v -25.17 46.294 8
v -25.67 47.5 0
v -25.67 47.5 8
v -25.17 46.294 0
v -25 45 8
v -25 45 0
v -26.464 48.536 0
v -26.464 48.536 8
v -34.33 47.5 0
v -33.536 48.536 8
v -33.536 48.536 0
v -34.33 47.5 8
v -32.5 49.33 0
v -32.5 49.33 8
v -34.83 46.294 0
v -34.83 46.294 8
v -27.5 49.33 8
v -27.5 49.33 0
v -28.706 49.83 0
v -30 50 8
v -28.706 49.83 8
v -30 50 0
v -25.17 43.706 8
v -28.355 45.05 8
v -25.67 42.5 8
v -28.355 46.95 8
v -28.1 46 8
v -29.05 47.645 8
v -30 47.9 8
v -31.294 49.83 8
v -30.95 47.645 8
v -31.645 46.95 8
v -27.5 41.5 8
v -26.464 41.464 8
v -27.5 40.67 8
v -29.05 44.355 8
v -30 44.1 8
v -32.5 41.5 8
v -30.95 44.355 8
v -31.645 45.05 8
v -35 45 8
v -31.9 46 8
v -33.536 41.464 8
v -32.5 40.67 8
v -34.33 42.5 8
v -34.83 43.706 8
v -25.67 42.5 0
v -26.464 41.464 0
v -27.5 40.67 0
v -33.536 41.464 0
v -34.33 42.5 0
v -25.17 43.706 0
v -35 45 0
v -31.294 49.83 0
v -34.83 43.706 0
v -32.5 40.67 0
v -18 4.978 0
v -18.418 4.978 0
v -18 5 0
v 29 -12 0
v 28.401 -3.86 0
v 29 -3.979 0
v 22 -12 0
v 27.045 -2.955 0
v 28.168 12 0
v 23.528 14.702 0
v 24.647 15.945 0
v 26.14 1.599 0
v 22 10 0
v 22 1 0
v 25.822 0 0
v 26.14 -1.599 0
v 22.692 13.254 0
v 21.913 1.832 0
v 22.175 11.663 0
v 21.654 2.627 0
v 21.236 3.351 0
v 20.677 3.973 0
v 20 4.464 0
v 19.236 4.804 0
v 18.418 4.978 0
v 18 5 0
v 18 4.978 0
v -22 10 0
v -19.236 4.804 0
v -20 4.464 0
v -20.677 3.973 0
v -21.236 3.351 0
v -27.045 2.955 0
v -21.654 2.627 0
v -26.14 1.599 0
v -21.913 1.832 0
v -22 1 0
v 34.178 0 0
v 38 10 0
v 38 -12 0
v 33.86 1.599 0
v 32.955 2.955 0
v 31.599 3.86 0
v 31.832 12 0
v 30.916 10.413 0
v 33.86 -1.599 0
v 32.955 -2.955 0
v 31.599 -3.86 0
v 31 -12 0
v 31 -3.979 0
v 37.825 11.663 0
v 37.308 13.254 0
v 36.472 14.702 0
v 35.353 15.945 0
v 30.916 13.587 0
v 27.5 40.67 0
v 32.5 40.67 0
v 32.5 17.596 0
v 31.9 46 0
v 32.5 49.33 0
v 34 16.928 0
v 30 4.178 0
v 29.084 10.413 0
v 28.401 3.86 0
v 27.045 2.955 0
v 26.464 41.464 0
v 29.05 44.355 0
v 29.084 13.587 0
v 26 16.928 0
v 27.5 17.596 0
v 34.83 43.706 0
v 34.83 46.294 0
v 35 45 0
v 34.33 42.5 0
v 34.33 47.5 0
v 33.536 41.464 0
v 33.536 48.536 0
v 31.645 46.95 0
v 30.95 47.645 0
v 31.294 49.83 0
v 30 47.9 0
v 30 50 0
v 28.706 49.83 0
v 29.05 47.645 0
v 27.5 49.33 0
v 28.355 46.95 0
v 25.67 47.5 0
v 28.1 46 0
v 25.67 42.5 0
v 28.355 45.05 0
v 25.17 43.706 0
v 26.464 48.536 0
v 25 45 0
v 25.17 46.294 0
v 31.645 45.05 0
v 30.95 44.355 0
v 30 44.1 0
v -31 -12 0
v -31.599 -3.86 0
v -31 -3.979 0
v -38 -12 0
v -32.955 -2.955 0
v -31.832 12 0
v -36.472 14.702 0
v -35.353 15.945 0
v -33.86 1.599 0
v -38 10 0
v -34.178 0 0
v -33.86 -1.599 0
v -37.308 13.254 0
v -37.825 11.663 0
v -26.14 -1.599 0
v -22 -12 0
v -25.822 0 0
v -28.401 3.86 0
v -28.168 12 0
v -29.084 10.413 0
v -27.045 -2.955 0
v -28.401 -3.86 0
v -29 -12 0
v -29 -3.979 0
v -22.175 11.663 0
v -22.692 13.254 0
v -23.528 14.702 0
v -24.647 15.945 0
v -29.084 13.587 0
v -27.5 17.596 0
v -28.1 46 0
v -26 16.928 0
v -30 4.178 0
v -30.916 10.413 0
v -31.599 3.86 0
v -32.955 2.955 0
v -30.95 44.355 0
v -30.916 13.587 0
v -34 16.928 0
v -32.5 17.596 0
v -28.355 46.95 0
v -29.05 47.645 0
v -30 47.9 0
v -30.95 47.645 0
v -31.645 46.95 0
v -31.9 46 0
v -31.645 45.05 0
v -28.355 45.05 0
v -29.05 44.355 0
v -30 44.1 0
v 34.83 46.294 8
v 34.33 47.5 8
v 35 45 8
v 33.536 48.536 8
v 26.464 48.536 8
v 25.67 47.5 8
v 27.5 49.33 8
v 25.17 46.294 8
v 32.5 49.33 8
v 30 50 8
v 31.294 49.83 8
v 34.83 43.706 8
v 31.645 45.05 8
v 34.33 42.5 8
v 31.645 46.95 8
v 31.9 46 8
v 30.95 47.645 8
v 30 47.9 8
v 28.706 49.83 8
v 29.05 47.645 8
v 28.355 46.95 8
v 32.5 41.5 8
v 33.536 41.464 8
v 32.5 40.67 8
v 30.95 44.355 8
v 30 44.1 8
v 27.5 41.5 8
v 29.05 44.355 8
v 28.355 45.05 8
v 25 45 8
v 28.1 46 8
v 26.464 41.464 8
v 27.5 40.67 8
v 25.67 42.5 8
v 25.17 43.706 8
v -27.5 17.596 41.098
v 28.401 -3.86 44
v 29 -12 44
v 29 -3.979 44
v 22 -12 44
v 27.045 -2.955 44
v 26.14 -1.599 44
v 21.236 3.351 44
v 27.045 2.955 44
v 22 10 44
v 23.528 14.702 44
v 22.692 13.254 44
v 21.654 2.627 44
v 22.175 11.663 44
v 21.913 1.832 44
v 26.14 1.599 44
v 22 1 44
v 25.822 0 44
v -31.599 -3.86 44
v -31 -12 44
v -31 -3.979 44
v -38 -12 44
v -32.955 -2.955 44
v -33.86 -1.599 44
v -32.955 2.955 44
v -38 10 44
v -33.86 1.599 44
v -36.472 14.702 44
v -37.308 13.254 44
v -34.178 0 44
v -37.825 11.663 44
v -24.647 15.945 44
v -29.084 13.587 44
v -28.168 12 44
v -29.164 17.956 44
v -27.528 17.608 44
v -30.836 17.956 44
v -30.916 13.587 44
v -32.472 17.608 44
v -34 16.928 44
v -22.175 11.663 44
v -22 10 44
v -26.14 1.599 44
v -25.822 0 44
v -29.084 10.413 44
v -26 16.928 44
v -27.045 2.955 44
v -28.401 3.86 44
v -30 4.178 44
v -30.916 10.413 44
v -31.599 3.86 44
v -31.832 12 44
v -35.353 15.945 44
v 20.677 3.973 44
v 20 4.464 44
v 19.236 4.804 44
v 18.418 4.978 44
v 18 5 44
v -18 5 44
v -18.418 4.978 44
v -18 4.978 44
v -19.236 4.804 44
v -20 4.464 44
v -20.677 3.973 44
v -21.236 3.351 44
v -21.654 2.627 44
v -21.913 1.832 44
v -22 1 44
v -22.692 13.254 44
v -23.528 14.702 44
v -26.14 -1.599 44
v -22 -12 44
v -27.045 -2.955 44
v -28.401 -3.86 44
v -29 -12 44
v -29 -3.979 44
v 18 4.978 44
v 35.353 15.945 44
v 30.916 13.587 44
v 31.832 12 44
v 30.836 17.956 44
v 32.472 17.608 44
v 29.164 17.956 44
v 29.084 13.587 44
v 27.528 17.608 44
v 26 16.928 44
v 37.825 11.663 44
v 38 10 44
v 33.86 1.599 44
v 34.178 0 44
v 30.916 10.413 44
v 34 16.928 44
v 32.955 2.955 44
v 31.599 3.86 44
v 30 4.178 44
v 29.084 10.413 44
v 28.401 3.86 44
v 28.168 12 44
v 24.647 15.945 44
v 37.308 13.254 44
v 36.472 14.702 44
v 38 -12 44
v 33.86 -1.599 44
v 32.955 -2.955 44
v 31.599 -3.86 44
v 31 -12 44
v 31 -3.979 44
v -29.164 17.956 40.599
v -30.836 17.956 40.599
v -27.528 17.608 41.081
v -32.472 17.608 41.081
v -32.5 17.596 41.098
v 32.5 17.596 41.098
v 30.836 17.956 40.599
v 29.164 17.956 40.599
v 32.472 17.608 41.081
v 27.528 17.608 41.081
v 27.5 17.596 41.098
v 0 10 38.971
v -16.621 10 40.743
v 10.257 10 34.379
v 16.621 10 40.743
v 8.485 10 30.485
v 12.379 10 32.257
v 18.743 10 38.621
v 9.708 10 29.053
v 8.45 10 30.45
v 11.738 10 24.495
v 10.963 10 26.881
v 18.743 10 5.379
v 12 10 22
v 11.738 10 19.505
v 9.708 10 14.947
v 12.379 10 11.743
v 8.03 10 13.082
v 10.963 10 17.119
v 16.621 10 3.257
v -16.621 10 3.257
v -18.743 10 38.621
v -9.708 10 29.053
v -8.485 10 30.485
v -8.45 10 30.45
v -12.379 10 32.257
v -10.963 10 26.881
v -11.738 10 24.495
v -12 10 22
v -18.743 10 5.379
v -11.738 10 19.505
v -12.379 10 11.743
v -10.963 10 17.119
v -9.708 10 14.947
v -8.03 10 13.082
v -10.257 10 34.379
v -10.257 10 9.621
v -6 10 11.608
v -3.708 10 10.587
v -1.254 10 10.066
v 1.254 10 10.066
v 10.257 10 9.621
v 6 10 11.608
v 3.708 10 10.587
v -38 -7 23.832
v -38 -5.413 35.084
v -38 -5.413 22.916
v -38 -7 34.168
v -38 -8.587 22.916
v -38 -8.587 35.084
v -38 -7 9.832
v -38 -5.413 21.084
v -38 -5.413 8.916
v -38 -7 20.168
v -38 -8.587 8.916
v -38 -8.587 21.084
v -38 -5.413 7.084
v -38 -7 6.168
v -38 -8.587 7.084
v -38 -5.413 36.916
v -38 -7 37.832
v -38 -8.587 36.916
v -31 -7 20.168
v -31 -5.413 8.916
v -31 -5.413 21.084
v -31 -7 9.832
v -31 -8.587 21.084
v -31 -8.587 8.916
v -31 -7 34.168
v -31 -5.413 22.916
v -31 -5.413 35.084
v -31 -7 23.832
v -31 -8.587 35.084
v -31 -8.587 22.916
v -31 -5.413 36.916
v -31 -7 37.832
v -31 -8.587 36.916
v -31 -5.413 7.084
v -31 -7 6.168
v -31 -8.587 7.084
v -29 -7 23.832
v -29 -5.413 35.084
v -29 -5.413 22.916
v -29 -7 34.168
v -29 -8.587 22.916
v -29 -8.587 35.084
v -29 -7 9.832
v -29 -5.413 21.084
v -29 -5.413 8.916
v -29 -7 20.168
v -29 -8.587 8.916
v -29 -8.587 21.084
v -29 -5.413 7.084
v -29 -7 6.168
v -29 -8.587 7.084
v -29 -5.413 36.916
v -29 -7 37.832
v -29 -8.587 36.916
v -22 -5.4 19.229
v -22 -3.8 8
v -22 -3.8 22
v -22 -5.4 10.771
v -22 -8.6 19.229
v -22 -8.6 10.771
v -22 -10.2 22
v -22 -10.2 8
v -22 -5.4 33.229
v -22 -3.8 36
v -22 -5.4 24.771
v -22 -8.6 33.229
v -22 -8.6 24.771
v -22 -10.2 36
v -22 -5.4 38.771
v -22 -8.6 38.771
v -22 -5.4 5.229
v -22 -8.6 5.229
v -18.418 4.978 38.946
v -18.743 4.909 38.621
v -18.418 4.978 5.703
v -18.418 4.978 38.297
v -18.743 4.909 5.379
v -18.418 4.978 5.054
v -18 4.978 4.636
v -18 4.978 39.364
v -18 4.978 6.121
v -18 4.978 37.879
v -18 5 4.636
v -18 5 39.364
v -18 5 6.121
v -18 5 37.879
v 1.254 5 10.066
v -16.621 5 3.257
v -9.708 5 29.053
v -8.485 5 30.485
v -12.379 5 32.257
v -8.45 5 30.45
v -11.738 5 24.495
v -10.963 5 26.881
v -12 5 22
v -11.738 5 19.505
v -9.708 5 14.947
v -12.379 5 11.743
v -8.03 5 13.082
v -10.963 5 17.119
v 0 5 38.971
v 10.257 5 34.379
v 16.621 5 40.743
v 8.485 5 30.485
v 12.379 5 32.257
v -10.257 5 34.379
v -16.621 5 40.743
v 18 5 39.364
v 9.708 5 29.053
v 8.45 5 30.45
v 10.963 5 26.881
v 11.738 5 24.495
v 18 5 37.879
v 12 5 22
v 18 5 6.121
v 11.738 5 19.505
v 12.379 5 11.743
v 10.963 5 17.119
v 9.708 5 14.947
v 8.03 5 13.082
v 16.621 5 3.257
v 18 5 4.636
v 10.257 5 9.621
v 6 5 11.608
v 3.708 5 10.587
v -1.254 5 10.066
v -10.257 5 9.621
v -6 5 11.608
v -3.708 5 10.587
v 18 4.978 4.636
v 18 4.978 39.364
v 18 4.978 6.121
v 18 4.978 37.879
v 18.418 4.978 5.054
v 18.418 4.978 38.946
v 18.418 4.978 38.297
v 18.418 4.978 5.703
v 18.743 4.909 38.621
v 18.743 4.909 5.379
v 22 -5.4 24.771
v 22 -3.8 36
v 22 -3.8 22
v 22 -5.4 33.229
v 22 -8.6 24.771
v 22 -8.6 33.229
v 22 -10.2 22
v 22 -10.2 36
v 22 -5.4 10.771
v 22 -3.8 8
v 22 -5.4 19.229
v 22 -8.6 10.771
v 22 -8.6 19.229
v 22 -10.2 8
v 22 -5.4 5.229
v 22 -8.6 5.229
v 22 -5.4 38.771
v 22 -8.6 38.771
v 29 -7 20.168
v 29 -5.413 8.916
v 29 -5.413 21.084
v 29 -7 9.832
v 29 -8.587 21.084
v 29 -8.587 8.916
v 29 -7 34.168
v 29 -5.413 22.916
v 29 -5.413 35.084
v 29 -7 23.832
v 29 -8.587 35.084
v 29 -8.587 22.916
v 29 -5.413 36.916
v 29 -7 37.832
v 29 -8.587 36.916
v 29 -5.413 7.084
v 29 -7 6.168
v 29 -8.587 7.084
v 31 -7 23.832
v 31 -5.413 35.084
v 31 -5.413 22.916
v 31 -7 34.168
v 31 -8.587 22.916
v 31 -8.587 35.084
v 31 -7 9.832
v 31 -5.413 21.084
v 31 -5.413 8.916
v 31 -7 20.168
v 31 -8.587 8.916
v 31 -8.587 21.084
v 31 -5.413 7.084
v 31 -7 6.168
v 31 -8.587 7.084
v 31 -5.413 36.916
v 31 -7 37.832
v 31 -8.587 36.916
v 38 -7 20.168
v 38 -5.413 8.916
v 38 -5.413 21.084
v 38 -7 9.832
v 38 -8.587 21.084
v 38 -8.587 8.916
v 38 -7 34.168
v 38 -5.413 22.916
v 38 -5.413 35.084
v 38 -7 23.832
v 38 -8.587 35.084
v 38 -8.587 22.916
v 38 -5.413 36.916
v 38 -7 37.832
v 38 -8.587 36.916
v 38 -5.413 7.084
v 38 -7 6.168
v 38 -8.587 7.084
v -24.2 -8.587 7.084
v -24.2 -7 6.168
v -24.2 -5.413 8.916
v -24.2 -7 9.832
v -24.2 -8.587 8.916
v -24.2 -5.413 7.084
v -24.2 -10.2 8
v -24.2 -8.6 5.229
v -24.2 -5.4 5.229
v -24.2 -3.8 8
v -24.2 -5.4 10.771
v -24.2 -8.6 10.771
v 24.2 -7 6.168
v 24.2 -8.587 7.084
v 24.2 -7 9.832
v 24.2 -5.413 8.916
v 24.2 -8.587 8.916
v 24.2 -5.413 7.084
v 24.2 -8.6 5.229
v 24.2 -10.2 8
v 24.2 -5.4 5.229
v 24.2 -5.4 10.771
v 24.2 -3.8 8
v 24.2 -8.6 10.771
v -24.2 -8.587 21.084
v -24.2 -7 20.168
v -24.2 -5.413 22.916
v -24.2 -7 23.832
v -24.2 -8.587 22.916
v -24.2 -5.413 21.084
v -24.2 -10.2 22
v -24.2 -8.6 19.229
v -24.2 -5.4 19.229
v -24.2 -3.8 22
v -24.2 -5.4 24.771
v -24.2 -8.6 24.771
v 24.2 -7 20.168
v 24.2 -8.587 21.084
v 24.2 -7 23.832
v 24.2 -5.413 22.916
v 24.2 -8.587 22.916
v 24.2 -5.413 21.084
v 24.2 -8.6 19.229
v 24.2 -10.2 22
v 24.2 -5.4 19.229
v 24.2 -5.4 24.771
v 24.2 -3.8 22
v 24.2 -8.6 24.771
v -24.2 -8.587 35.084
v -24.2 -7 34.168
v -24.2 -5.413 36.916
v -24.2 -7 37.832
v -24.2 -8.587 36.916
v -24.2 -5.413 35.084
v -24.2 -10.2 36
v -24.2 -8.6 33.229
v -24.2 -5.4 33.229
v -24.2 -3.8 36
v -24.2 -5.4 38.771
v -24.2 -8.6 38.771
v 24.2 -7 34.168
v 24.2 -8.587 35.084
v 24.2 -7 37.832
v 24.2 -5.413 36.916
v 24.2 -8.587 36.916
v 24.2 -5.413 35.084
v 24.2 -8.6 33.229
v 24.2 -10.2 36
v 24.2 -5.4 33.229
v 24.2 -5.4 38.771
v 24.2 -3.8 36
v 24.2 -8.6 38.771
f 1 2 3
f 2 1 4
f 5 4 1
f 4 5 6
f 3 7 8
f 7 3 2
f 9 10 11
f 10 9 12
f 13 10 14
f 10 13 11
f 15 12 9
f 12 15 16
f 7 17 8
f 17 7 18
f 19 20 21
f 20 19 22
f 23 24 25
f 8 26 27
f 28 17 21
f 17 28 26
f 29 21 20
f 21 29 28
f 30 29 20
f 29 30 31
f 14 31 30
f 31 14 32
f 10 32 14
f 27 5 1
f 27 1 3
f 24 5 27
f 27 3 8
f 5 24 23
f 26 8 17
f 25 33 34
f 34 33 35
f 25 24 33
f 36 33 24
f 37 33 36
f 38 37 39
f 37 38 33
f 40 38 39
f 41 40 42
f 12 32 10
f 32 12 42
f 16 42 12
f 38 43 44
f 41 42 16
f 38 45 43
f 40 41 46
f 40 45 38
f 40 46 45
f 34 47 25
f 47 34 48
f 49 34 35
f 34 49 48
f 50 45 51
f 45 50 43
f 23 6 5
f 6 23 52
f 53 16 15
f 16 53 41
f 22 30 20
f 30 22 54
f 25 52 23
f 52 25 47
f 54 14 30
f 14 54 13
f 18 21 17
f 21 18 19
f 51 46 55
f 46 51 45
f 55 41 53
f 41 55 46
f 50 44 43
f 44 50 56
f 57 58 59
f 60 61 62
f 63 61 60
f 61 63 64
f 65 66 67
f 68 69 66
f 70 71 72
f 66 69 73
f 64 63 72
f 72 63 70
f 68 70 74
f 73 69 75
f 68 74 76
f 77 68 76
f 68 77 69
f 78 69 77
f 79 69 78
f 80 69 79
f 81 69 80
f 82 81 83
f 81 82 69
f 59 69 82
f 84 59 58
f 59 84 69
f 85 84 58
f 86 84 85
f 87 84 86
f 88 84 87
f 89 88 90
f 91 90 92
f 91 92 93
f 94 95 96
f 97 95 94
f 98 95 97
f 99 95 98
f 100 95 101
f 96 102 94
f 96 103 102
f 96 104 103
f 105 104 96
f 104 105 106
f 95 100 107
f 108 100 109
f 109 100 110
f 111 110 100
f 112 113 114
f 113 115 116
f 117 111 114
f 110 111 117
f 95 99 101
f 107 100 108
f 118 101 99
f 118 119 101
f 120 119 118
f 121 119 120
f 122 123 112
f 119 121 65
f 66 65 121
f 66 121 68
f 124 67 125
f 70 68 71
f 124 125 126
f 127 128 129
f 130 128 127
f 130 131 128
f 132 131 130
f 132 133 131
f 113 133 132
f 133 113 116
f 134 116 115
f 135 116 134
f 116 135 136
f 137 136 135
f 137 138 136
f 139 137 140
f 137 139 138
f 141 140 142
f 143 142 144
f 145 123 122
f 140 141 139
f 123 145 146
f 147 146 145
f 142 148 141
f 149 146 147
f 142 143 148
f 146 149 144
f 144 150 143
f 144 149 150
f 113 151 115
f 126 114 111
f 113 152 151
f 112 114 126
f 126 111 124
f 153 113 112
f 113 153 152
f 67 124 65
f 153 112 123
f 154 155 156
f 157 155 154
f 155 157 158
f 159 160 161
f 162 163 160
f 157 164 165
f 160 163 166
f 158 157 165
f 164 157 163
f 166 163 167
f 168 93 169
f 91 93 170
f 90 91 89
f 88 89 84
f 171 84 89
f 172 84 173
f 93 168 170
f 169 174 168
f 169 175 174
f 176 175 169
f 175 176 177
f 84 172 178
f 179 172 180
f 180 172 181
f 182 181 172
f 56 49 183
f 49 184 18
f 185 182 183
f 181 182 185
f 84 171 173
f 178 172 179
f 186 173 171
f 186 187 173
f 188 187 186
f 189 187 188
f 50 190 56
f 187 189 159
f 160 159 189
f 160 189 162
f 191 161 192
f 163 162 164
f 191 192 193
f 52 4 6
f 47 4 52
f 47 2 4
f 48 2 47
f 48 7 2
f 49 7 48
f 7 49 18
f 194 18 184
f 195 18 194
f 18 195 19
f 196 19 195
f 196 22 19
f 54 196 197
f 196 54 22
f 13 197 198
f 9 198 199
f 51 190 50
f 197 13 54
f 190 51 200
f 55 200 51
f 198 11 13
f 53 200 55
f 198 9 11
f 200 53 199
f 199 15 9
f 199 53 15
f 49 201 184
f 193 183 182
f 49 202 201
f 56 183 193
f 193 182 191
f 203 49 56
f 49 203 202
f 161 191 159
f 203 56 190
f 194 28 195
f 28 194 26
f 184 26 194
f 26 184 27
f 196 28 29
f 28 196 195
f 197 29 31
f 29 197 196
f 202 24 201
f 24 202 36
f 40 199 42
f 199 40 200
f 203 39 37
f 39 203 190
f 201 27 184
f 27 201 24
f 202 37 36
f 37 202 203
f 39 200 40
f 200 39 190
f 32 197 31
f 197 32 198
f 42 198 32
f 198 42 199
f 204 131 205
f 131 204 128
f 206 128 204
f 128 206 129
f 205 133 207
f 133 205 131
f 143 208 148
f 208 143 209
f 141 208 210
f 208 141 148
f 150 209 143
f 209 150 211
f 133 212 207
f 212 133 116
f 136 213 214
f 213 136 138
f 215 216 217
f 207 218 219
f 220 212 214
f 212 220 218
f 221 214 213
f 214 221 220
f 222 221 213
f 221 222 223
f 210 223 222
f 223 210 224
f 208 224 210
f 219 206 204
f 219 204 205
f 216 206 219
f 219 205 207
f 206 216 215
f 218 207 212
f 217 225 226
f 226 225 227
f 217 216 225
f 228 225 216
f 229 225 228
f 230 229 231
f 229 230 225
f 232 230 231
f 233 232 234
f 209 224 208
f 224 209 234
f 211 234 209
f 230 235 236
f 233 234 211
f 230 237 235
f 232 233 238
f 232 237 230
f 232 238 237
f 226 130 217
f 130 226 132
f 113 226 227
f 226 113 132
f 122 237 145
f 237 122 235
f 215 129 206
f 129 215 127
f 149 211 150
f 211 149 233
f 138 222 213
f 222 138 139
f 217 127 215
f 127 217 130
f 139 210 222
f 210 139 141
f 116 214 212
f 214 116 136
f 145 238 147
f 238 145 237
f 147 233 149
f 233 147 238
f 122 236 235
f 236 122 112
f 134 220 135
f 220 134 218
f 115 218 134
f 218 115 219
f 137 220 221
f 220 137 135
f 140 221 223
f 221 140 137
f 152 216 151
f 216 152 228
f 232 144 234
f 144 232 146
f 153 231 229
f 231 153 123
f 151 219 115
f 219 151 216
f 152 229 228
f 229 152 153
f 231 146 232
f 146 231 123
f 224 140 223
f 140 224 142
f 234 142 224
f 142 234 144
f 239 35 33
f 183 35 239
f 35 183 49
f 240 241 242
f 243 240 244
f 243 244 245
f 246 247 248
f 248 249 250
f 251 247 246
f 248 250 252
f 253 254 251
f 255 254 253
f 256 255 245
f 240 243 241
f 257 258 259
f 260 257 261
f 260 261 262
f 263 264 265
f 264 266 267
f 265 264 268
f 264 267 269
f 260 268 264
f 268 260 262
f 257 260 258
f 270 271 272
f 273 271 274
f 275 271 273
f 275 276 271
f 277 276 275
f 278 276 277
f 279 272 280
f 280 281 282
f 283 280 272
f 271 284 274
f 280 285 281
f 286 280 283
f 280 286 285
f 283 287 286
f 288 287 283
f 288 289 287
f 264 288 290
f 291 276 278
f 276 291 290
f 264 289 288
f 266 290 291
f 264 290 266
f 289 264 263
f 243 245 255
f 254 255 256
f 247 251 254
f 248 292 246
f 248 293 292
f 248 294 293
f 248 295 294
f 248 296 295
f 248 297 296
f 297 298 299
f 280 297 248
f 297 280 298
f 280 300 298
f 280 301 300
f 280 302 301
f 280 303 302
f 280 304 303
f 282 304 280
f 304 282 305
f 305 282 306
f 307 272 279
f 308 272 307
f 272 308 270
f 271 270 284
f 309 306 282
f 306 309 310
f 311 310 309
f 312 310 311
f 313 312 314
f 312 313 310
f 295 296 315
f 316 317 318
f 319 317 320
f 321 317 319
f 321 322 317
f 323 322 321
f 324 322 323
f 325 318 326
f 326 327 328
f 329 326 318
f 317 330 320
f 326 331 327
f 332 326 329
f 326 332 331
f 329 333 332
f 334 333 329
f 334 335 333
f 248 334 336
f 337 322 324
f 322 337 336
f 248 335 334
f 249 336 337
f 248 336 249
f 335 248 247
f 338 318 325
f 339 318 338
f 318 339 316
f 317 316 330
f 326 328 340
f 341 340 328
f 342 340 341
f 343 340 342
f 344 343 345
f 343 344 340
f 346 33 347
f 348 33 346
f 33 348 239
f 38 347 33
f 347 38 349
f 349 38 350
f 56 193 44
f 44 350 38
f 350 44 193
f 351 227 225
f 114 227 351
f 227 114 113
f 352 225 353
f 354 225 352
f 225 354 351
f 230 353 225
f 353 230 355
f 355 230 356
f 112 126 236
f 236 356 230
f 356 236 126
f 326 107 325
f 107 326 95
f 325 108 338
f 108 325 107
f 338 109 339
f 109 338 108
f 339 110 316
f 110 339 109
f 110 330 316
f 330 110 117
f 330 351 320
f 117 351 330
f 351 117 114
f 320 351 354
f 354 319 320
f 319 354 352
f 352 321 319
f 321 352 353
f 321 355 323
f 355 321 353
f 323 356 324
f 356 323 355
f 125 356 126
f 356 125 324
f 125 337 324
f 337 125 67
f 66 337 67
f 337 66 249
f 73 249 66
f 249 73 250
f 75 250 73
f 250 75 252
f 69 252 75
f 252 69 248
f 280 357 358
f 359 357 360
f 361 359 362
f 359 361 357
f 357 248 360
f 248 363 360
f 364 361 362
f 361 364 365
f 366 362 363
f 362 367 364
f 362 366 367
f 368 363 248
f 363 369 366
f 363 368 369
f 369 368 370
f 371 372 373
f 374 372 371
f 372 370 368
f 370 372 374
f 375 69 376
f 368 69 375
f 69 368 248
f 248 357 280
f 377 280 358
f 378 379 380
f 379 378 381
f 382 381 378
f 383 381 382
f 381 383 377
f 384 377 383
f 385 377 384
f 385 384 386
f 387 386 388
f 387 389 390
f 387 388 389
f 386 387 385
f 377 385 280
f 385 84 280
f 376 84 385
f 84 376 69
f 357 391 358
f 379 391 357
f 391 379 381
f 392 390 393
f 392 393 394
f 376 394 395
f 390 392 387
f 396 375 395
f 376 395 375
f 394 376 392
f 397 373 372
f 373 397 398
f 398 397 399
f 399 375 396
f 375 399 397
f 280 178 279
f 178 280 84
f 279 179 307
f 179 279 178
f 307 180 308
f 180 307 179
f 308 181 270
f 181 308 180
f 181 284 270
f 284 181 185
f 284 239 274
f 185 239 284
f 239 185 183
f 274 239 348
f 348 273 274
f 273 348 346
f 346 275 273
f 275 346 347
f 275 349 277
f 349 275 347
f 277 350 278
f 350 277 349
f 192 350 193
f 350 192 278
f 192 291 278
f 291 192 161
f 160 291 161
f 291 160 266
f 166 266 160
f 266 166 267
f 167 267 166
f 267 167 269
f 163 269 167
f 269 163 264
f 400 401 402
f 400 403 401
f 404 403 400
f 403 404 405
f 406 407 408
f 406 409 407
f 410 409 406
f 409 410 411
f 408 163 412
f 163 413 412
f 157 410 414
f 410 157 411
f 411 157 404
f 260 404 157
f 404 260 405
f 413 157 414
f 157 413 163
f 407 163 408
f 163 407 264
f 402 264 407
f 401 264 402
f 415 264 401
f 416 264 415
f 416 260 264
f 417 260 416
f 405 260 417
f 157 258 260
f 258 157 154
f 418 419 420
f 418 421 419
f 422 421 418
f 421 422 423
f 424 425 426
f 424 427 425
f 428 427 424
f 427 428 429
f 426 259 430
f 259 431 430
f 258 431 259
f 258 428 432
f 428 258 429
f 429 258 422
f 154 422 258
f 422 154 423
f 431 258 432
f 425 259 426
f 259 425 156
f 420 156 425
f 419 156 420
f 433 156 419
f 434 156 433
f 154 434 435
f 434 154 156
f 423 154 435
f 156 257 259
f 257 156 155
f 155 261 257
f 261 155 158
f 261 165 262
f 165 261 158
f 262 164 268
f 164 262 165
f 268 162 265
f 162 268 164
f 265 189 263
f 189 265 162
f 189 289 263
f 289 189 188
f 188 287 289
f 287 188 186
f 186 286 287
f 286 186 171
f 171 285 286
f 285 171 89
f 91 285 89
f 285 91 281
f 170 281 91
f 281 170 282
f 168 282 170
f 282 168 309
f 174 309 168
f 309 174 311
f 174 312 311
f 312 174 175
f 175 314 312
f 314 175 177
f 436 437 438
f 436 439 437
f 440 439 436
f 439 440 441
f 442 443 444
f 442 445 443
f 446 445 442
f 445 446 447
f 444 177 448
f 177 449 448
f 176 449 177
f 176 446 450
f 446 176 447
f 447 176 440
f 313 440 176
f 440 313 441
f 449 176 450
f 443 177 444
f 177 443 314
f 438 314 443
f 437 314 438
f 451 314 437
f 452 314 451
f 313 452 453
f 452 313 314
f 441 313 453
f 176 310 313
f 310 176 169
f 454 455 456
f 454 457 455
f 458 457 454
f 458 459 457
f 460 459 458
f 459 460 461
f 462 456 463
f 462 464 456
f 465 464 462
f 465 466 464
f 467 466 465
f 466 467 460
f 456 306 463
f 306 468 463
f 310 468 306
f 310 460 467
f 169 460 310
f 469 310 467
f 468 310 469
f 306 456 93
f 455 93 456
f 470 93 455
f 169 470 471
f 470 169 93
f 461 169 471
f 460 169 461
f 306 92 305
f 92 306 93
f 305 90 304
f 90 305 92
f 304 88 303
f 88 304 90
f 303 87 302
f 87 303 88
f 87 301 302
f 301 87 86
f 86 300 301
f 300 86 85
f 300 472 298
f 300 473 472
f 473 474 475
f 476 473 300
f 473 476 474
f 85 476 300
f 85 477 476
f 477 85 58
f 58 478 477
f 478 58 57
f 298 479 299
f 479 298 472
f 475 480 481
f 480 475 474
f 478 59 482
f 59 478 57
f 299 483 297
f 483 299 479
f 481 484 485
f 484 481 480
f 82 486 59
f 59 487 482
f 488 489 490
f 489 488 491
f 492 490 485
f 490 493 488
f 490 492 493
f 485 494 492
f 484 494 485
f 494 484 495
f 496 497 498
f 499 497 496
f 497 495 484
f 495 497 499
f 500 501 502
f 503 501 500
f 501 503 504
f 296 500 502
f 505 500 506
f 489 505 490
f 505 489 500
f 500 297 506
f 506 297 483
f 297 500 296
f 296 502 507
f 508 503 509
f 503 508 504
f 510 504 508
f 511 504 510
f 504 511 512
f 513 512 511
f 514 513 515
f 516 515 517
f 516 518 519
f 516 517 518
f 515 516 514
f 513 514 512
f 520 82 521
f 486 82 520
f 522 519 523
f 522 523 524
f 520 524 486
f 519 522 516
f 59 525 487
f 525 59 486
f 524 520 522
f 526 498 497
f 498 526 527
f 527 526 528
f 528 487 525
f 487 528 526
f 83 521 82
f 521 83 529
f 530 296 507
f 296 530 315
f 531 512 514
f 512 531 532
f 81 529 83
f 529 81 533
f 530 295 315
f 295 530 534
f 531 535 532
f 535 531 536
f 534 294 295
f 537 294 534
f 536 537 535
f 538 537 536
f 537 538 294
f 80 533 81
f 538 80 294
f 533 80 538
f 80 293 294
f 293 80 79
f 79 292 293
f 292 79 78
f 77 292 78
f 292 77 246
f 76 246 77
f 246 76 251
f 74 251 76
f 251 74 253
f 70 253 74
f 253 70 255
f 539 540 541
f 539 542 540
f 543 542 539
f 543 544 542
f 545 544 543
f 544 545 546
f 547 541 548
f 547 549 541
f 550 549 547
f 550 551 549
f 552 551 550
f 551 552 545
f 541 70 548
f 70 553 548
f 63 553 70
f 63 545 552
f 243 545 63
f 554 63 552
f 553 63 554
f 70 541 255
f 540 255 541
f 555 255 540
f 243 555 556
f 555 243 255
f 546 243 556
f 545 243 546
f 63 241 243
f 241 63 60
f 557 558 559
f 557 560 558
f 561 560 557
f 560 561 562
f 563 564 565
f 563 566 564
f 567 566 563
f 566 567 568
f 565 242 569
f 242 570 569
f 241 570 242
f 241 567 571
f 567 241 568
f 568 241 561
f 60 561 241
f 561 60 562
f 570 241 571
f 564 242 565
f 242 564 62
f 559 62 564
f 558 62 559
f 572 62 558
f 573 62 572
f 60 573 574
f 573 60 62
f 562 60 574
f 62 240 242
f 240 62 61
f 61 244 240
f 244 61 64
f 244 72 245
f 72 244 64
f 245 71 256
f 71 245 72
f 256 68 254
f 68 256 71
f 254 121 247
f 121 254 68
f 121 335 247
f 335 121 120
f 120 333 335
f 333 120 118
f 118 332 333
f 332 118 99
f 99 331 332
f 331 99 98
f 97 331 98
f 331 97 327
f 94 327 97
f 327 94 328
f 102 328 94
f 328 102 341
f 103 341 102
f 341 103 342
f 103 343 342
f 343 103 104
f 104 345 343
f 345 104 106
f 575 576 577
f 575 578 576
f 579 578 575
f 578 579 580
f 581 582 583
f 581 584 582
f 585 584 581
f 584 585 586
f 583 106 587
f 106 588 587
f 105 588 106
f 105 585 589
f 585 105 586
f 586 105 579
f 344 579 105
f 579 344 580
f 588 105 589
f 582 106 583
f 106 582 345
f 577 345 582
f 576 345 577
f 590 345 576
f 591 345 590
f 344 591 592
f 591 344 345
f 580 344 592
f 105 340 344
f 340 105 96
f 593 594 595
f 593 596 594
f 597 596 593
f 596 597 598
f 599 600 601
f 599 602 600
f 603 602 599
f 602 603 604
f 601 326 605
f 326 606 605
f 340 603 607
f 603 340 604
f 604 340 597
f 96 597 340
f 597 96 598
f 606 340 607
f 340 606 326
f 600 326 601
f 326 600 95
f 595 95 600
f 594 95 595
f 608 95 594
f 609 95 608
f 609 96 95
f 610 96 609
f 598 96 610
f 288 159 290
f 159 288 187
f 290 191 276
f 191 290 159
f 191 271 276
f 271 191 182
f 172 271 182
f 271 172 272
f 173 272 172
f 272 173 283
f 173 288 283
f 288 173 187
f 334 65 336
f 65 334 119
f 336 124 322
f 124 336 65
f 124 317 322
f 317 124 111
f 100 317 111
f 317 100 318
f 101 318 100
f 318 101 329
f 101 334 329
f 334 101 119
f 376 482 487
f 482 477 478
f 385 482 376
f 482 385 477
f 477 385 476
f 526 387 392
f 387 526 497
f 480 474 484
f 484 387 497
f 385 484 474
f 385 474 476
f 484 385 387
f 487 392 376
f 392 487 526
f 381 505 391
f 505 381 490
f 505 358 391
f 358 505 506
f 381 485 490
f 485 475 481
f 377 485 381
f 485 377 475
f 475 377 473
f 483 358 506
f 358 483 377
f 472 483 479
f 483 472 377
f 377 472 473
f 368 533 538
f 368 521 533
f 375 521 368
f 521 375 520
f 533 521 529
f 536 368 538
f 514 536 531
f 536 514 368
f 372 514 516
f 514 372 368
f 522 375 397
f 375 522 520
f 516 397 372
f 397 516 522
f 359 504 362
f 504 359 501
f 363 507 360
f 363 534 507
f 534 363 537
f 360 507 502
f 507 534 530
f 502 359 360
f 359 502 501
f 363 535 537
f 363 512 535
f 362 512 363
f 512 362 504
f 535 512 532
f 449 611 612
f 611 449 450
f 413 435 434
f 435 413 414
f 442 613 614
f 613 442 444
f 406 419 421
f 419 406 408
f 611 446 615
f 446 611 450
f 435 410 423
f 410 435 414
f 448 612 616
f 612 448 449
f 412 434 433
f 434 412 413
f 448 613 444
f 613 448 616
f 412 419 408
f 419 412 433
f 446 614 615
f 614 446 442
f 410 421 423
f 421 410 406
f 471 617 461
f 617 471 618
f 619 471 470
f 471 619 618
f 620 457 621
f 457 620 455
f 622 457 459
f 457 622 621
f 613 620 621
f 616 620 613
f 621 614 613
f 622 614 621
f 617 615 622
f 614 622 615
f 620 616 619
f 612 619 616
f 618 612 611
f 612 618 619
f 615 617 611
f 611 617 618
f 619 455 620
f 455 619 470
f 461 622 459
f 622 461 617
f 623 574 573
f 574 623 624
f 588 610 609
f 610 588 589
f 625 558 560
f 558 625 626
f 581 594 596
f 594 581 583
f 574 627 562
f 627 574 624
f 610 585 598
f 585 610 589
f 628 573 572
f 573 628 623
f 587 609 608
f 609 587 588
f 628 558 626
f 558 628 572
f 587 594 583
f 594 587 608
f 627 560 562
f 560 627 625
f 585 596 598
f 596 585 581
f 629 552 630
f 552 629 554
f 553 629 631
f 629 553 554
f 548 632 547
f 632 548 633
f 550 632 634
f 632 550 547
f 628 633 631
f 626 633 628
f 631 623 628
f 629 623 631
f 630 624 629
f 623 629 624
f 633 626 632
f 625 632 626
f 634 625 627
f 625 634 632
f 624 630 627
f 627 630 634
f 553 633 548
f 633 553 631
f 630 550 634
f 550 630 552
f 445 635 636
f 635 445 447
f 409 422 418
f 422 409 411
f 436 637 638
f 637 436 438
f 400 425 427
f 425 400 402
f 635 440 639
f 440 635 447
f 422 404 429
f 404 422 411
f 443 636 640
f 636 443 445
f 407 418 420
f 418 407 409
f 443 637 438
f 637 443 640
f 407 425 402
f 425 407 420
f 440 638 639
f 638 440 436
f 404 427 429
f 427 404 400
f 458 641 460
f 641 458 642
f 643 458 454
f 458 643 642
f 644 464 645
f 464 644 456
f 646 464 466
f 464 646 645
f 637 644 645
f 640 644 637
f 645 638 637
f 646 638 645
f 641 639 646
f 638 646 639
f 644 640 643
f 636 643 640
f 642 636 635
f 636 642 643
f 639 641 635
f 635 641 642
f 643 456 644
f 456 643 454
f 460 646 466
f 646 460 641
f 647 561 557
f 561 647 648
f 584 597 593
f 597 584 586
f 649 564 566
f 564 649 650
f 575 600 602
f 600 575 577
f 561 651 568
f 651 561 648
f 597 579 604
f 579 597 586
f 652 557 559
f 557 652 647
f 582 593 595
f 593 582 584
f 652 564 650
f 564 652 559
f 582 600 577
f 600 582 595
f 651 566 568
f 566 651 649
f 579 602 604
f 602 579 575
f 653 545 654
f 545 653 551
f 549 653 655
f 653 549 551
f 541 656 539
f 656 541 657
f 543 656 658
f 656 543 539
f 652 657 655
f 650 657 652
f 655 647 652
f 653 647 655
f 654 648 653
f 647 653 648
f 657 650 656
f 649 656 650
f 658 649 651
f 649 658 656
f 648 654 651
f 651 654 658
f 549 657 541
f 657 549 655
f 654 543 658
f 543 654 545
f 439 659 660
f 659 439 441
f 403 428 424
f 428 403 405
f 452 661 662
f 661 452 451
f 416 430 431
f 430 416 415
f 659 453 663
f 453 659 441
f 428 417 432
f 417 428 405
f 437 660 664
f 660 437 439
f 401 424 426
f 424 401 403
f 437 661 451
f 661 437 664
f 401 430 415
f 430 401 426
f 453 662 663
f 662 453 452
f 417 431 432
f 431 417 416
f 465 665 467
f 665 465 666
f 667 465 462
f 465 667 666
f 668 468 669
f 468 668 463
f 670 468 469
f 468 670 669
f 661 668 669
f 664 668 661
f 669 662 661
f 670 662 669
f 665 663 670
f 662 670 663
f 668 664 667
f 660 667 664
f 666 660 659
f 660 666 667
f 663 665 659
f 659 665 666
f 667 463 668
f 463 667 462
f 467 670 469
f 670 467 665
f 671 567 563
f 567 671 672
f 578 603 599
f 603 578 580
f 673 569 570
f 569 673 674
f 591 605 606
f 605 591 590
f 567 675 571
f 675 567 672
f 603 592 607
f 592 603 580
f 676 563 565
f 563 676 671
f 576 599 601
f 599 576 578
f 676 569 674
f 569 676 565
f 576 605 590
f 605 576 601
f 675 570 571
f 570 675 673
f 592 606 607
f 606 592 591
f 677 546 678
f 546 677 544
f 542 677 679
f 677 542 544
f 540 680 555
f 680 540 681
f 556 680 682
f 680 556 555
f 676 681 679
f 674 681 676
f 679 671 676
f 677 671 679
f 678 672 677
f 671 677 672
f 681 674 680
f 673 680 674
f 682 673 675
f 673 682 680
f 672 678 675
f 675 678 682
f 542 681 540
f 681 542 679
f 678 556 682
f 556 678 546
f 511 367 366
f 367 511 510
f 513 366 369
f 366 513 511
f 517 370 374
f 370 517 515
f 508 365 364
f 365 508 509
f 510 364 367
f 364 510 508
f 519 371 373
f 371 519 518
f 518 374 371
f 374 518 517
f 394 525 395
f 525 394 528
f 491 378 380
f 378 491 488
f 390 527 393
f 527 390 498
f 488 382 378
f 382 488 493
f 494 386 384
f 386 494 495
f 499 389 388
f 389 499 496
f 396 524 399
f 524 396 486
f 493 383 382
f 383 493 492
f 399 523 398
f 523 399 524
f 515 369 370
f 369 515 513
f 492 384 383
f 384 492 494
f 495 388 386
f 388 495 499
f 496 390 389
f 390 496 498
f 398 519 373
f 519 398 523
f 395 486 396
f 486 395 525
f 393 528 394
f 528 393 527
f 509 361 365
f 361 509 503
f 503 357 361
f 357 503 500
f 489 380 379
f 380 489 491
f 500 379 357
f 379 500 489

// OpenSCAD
// file: polyholes.scad
//
// Mendel90
//
// GNU GPL v2
// nop.head@gmail.com
// hydraraptor.blogspot.com
//
// See http://hydraraptor.blogspot.com/2011/02/polyholes.html
//
function sides(r) = max(round(4 *r),3);
function corrected_radius(r,n) = 0.1 + r / cos(180 / n);
function corrected_diameter(d) = 0.2 + d / cos(180 / sides(d / 2));

module poly_circle(r, center = false) {
    n = sides(r);
    circle(r = corrected_radius(r,n), $fn = n, center = center);
}

module poly_cylinder(r, h, center = false) {
    n = sides(r);
    cylinder(h = h, r = corrected_radius(r,n), $fn = n, center = center);
}

module poly_d_cylinder(r, center = false) {
    n = sides(r);
    r = corrected_radius(r,n);
    cylinder(h = h, r = r, $fn = n, center = center);
    translate([0, -r, 0])
        cube([r, 2 * r, h]);
}

/**
 * Make a thin-walled cylindrical tube.
 * @param r outside radius
 * @param h height of tube
 * @param thickness wall thickness
 */
module poly_tube(r = 5, h = 5, thickness = 1, center = false) {
    translate(center ? [0, 0, -h / 2] : 0) linear_extrude(height = h) difference() {
        circle(r);
        poly_circle(r - thickness);
    }
}
// file: bracket.scad
include <configuration.scad>

$fa = 12;
$fs = 0.5;
use <polyholes.scad>

side_thickness=16;
round_rad=4;
min_pinch_thickness=4;


module screws() {
  screw_rad=3.0/2;
  nut_depth=2.3;
  for (x = [-1, 1]) {
    translate([x*smooth_rod_separation/2, 0, 0]) {
      // Push-through M3 screw hole.
      translate([0, -smooth_rod_radius-2*screw_rad, 0]) rotate([0, 90, 0])
	poly_cylinder(r=screw_rad, h=side_thickness+2, center=true);
      // M3 nut holder.
      translate([-x*(side_thickness/2-nut_depth/2+0.1), -smooth_rod_radius-2*screw_rad, 0])
	rotate([30, 0, 0]) rotate([0, 90, 0])
	cylinder(r=3.2, h=nut_depth, center=true, $fn=6);
    }
  }
}

module fins(h) {
    for (x = [-1, 1]) {
        // Diagonal fins.
        hull() {
            translate([x*smooth_rod_separation/2, bracket_fin_length-4, 8/2-h/2]) cube([5, 1, 8], center=true);
            translate([x*smooth_rod_separation/2, 15, 0]) #cube([5, 1, h], center=true);
        }
        // Extra mounting screw holes.
        translate([x*smooth_rod_separation/2, bracket_fin_length, 4-h/2]) difference() {
            cylinder(r=5, h=8, center=true, $fn=24);
            translate([0, 1, 0]) cylinder(r=1.9, h=9, center=true, $fn=12);
        }
    }
}

module bracket(h,fins=false) {
  translate([0, 0, -h/2]) linear_extrude(height=h, convexity=3) difference() {
    union() {
      translate([0, 3-smooth_rod_radius]) square([smooth_rod_separation+side_thickness, smooth_rod_radius + 18], center=true);
      for (x = [-smooth_rod_separation/2, smooth_rod_separation/2]) {
        // Sandwich mount.
        translate([x, 10]) circle(r=side_thickness/2, center=true);
        // Smooth rod mounting slot extra.
	translate([x, 0]) circle(r=smooth_rod_radius+min_pinch_thickness, center=true);
      }
    }
    for (x = [-smooth_rod_separation/2, smooth_rod_separation/2]) {
      // Sandwich mount.
      translate([x, 12]) poly_circle(r=1.5, center=true);
      // Smooth rod mounting slots.
      translate([x, 0]) {
	poly_circle(r=smooth_rod_radius, center=true);
	translate([0, -10, 0]) square([2, 20], center=true);
      }
    }
    // Belt path.
    difference() {
      union() {
	translate([0, -5]) square([smooth_rod_separation-side_thickness-2*round_rad, 20], center=true);
	translate([0, -9]) square([smooth_rod_separation-side_thickness, 20], center=true);
        for (x = [-1, 1]) {
	  translate([x*(smooth_rod_separation/2-side_thickness/2-round_rad), 5-round_rad]) circle(r=round_rad, center=true);
        }
      }
      // Smooth rod mounting slot extra.
      for (x = [-smooth_rod_separation/2, smooth_rod_separation/2]) {
	translate([x, 0]) {
	  circle(r=smooth_rod_radius+min_pinch_thickness, center=true);
	}
      }
    }
  }
  if (fins) fins(h);
}

translate([0, 0, 10]) bracket(20);
// file: configuration.scad
// Bearing dimensions: ID, OD, W
bearing623 = [3, 10, 4];
bearing624 = [4, 13, 5];
bearing608 = [8, 22, 7];
bearinglm8uu = [8, 15, 25];
bearinglm10uu = [10, 19, 29];
bearinglm12uu = [12, 21, 31];

mini = true; // true = Rostock mini, false = whatever ya want

small_pulley = mini ? false : true;  // true = 16 thooth GT2, false = 20 tooth GT2

smooth_rod_separation = 60;
smooth_rod_length = mini ? 450 : 770;
smooth_rod_radius = mini ? 4 : 6;
smooth_rod_bearing = mini ? bearinglm8uu : bearinglm12uu;

bracket_fin_length = mini ? 45 : 70;

motor_end_height = 44;

idler_end_height = 28;
idler_bearing = small_pulley ? bearing624 : bearing608;

platform_thickness = 8;
platform_hinge_offset = 33;

bed_thickness = 12;
pcb_thickness = 2;

rod_separation = 50;
rod_length = mini ? 150 : 250;
rod_radius = mini ? 75 : 124;

// These are needed by modules in a couple of different files
carriage_height = smooth_rod_bearing[2];
carriage_hinge_offset = smooth_rod_bearing[1]/2+14.5;

idler_fins = mini ? false : true;       // If true, add fins to the idler brackets for extra stability at the top
box_idler = mini ? false : true;        // If true, add boxing around idler bearing to reduce axle torque

bottom_endstops = false; // If true, adds extra mount points to the platform

ball_joints = mini ? false : true;
ball_rad = 9.5 / 2 + 0.2; // Add a little extra radius for glue
cup_rad = ball_rad + 1;
cup_offset = cup_rad-platform_thickness/2;
// main file
include <configuration.scad>
use <bracket.scad>

h = motor_end_height; // Total height.
m = 29; // Motor mounting screws distance (center to center)

module motor_end() {
  translate([0, 0, h/2]) 
  difference() {
      bracket(h,fins=true);
    // Motor shaft (RepRap logo)
    rotate([90, 0, 0]) cylinder(r=12, h=40, center=true);
    translate([0, 0, sin(45)*12]) rotate([0, 45, 0])
      cube([12, 40, 12], center=true);
    // Motor mounting screw slots
    for (x = [-1,1], z=[-1, 1])
      translate([x*m/2, 0, z*m/2]) rotate([0, -1*x*z*45, 0]) cube([9, 40, 3], center=true);
    for (z = [-14, 0, 14]) {
      translate([0, 0, z]) screws();
    }
  }
}

motor_end();
